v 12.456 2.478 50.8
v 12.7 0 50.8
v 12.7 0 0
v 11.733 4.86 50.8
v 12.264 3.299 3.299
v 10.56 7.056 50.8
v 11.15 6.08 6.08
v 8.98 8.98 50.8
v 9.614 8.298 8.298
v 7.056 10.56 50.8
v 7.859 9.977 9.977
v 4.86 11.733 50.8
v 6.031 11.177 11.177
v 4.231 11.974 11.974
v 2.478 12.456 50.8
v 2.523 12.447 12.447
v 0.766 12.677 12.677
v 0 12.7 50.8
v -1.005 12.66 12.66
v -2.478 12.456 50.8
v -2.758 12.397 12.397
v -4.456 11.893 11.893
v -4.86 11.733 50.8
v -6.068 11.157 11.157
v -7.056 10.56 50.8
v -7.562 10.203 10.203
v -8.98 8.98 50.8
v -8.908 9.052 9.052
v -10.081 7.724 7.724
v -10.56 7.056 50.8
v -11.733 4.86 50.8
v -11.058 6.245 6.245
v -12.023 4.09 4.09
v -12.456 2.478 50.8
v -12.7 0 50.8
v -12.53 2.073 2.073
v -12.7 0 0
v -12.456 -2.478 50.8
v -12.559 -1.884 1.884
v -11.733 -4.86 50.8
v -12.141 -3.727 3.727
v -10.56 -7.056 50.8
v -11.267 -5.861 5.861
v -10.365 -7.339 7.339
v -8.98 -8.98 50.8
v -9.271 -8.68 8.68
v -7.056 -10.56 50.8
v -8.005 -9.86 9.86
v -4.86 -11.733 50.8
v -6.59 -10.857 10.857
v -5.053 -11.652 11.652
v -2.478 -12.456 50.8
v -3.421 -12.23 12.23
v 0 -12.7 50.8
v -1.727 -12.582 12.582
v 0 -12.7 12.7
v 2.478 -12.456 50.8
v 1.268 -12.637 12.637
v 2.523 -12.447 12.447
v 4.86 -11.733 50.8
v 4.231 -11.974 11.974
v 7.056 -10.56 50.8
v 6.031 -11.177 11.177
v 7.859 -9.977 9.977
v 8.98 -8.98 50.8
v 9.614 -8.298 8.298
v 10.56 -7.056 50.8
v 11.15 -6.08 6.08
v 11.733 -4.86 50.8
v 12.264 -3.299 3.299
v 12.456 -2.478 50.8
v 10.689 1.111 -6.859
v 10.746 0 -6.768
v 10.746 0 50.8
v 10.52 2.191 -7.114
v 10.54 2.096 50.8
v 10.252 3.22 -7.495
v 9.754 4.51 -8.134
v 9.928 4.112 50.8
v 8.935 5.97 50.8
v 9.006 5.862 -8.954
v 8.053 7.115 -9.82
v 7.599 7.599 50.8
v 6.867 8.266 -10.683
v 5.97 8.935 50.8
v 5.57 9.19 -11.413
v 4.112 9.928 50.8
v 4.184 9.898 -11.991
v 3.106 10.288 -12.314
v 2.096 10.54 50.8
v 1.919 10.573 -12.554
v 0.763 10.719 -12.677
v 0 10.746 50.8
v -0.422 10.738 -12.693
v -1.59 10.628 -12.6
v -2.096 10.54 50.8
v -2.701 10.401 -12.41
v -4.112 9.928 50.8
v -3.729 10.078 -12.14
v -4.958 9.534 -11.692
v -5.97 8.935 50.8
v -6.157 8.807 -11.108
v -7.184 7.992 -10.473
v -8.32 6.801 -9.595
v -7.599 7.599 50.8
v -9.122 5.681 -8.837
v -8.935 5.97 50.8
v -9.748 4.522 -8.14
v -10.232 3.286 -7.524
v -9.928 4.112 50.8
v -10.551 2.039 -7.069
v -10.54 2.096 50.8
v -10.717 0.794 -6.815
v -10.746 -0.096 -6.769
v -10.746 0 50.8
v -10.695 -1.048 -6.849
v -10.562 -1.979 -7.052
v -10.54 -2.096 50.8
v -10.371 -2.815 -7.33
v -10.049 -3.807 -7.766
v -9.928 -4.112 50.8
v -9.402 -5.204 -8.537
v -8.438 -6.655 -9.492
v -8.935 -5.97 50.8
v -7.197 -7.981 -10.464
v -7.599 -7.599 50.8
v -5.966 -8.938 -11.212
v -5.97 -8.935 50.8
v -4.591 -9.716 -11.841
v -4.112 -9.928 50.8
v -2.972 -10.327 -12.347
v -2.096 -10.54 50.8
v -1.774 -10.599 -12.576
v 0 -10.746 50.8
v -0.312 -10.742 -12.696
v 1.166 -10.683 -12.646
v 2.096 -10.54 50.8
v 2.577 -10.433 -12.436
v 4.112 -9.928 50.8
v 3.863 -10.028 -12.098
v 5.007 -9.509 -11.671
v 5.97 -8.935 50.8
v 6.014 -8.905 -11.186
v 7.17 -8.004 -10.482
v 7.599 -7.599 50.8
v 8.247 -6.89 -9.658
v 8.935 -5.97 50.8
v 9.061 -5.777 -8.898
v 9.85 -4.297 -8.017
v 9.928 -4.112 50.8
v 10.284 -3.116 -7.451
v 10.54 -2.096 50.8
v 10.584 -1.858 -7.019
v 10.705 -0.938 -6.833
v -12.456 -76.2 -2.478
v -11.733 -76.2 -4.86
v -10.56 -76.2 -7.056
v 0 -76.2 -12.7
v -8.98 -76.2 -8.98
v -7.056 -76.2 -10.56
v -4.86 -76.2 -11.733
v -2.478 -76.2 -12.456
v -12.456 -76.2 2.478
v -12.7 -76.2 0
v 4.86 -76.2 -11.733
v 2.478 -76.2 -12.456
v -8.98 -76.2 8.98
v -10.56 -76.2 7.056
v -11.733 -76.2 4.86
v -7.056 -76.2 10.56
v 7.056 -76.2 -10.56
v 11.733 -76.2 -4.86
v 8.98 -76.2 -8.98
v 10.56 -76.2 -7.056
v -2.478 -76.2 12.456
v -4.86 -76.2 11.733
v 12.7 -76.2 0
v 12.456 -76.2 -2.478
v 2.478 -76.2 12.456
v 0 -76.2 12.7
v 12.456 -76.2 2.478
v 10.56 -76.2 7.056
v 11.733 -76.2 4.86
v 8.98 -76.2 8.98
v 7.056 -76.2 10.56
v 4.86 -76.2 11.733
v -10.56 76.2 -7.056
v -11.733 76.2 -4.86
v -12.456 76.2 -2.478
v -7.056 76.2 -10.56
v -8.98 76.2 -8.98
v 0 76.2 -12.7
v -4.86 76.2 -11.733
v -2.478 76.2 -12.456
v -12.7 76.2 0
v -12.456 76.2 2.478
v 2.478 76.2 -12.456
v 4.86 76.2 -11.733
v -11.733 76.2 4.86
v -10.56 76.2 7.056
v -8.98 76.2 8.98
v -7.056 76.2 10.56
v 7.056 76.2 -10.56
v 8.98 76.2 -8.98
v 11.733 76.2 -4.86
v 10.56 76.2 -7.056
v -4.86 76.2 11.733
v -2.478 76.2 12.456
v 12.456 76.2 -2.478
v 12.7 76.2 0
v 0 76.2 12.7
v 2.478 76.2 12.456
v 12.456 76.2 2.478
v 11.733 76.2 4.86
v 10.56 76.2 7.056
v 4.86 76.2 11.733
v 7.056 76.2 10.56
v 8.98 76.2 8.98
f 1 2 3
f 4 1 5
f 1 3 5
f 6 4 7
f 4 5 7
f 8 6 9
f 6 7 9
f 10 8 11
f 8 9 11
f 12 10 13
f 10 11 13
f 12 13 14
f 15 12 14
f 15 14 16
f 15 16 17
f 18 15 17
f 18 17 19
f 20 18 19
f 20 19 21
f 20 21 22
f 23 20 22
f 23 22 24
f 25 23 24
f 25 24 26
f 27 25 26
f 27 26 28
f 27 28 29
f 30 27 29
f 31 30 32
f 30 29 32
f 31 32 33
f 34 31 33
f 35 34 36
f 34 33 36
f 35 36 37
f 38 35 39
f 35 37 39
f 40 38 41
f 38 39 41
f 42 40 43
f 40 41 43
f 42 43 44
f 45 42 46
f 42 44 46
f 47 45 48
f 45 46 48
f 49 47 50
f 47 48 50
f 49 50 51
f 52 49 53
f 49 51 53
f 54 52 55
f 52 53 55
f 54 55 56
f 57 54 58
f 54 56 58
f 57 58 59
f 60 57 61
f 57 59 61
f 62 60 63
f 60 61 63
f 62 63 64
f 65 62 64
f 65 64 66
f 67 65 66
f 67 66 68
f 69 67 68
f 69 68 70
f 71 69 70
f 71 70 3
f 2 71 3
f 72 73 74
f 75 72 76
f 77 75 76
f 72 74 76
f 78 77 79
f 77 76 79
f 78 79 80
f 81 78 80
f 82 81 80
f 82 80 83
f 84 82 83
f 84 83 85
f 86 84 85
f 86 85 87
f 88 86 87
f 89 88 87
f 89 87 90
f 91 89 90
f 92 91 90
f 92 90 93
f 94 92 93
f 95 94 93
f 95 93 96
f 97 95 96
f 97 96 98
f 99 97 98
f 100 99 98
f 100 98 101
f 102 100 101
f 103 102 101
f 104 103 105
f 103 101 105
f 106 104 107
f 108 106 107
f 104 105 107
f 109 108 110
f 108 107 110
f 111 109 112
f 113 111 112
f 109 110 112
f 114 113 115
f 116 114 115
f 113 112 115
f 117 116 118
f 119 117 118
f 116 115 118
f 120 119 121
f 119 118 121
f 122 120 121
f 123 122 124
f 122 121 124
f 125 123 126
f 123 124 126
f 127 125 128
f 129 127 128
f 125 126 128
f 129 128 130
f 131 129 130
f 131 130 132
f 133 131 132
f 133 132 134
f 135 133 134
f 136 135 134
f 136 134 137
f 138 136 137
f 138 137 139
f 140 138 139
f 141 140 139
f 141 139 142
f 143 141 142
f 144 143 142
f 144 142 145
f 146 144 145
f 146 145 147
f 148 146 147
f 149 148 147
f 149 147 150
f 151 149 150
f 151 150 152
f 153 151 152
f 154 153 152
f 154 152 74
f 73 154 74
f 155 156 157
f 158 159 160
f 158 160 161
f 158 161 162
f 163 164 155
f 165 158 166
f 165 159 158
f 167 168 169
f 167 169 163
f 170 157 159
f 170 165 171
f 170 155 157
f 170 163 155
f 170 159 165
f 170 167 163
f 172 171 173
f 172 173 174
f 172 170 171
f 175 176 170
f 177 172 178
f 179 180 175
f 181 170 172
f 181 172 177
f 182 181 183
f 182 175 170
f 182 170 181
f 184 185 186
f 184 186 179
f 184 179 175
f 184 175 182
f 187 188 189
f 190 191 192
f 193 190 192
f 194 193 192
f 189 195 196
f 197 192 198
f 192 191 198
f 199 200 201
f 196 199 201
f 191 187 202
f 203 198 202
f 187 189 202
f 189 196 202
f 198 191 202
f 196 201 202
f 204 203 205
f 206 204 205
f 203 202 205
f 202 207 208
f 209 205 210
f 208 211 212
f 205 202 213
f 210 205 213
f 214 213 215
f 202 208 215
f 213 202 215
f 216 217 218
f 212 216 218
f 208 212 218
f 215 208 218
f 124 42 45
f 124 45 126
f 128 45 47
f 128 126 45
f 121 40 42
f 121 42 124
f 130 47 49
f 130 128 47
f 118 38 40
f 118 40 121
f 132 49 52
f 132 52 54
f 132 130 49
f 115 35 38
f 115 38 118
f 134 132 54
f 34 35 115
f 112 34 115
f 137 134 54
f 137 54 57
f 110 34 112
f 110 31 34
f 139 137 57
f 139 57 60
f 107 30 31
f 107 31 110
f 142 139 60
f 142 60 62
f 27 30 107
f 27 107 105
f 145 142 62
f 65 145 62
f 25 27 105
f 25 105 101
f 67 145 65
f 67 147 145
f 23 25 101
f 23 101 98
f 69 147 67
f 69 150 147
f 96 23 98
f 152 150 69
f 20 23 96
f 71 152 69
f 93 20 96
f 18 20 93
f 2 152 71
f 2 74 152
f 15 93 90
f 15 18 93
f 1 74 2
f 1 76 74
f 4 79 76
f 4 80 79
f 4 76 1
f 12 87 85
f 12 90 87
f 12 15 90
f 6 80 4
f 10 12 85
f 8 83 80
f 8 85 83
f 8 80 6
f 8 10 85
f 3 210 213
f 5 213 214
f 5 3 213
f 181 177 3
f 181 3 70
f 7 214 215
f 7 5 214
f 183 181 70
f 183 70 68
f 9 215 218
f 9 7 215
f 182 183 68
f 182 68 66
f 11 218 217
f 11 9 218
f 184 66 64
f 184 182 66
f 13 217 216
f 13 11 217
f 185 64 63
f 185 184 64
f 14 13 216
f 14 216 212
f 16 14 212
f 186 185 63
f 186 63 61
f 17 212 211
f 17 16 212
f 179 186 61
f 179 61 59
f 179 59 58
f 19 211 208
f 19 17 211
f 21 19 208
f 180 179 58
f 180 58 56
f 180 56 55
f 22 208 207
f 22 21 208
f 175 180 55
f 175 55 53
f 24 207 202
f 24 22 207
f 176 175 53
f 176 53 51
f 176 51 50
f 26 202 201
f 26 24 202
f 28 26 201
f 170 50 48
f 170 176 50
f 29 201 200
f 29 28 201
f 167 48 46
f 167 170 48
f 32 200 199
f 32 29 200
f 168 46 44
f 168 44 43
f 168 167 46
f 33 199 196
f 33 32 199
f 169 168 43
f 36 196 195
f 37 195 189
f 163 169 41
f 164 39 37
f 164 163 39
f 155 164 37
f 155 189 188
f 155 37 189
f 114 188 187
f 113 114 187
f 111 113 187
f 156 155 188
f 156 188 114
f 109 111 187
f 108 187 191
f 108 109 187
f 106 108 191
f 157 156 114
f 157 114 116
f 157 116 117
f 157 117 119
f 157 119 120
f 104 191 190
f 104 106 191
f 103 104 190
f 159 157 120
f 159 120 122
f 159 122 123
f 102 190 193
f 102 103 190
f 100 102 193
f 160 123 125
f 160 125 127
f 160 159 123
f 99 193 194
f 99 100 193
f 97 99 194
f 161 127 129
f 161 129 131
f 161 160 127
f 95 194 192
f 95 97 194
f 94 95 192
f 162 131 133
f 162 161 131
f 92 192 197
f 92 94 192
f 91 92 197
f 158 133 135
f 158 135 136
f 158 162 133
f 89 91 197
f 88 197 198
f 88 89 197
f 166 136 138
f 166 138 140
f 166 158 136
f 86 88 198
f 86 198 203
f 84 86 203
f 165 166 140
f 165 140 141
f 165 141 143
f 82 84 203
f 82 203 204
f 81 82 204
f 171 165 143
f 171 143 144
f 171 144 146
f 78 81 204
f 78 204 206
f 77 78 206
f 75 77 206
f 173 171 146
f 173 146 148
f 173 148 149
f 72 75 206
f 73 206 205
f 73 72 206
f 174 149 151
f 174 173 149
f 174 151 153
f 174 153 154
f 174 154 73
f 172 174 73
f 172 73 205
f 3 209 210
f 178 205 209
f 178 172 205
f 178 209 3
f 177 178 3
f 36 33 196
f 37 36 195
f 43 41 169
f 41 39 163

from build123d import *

# Parameters (mm, degrees)
F0_R     = 12.7
F1_DEPTH = 76.2
F2_R     = 12.7
F3_DEPTH = 50.8
F4_R     = 10.74617
F5_DEPTH = 63.501


with BuildPart() as f1:
    # F0 (on Front) → F1 (new body, symmetric)
    with BuildSketch(Plane.XZ):
        Circle(F0_R)
    extrude(amount=F1_DEPTH, both=True)

    # F2 (on Top) → F3 (join)
    with BuildSketch(Plane.XY):
        Circle(F2_R)
    extrude(amount=F3_DEPTH)

    # F4 (on face) → F5 (cut, through all)
    with BuildSketch(Plane.XY.offset(50.8)):
        Circle(F4_R)
    extrude(amount=-F5_DEPTH, mode=Mode.SUBTRACT)


solid = f1.part
